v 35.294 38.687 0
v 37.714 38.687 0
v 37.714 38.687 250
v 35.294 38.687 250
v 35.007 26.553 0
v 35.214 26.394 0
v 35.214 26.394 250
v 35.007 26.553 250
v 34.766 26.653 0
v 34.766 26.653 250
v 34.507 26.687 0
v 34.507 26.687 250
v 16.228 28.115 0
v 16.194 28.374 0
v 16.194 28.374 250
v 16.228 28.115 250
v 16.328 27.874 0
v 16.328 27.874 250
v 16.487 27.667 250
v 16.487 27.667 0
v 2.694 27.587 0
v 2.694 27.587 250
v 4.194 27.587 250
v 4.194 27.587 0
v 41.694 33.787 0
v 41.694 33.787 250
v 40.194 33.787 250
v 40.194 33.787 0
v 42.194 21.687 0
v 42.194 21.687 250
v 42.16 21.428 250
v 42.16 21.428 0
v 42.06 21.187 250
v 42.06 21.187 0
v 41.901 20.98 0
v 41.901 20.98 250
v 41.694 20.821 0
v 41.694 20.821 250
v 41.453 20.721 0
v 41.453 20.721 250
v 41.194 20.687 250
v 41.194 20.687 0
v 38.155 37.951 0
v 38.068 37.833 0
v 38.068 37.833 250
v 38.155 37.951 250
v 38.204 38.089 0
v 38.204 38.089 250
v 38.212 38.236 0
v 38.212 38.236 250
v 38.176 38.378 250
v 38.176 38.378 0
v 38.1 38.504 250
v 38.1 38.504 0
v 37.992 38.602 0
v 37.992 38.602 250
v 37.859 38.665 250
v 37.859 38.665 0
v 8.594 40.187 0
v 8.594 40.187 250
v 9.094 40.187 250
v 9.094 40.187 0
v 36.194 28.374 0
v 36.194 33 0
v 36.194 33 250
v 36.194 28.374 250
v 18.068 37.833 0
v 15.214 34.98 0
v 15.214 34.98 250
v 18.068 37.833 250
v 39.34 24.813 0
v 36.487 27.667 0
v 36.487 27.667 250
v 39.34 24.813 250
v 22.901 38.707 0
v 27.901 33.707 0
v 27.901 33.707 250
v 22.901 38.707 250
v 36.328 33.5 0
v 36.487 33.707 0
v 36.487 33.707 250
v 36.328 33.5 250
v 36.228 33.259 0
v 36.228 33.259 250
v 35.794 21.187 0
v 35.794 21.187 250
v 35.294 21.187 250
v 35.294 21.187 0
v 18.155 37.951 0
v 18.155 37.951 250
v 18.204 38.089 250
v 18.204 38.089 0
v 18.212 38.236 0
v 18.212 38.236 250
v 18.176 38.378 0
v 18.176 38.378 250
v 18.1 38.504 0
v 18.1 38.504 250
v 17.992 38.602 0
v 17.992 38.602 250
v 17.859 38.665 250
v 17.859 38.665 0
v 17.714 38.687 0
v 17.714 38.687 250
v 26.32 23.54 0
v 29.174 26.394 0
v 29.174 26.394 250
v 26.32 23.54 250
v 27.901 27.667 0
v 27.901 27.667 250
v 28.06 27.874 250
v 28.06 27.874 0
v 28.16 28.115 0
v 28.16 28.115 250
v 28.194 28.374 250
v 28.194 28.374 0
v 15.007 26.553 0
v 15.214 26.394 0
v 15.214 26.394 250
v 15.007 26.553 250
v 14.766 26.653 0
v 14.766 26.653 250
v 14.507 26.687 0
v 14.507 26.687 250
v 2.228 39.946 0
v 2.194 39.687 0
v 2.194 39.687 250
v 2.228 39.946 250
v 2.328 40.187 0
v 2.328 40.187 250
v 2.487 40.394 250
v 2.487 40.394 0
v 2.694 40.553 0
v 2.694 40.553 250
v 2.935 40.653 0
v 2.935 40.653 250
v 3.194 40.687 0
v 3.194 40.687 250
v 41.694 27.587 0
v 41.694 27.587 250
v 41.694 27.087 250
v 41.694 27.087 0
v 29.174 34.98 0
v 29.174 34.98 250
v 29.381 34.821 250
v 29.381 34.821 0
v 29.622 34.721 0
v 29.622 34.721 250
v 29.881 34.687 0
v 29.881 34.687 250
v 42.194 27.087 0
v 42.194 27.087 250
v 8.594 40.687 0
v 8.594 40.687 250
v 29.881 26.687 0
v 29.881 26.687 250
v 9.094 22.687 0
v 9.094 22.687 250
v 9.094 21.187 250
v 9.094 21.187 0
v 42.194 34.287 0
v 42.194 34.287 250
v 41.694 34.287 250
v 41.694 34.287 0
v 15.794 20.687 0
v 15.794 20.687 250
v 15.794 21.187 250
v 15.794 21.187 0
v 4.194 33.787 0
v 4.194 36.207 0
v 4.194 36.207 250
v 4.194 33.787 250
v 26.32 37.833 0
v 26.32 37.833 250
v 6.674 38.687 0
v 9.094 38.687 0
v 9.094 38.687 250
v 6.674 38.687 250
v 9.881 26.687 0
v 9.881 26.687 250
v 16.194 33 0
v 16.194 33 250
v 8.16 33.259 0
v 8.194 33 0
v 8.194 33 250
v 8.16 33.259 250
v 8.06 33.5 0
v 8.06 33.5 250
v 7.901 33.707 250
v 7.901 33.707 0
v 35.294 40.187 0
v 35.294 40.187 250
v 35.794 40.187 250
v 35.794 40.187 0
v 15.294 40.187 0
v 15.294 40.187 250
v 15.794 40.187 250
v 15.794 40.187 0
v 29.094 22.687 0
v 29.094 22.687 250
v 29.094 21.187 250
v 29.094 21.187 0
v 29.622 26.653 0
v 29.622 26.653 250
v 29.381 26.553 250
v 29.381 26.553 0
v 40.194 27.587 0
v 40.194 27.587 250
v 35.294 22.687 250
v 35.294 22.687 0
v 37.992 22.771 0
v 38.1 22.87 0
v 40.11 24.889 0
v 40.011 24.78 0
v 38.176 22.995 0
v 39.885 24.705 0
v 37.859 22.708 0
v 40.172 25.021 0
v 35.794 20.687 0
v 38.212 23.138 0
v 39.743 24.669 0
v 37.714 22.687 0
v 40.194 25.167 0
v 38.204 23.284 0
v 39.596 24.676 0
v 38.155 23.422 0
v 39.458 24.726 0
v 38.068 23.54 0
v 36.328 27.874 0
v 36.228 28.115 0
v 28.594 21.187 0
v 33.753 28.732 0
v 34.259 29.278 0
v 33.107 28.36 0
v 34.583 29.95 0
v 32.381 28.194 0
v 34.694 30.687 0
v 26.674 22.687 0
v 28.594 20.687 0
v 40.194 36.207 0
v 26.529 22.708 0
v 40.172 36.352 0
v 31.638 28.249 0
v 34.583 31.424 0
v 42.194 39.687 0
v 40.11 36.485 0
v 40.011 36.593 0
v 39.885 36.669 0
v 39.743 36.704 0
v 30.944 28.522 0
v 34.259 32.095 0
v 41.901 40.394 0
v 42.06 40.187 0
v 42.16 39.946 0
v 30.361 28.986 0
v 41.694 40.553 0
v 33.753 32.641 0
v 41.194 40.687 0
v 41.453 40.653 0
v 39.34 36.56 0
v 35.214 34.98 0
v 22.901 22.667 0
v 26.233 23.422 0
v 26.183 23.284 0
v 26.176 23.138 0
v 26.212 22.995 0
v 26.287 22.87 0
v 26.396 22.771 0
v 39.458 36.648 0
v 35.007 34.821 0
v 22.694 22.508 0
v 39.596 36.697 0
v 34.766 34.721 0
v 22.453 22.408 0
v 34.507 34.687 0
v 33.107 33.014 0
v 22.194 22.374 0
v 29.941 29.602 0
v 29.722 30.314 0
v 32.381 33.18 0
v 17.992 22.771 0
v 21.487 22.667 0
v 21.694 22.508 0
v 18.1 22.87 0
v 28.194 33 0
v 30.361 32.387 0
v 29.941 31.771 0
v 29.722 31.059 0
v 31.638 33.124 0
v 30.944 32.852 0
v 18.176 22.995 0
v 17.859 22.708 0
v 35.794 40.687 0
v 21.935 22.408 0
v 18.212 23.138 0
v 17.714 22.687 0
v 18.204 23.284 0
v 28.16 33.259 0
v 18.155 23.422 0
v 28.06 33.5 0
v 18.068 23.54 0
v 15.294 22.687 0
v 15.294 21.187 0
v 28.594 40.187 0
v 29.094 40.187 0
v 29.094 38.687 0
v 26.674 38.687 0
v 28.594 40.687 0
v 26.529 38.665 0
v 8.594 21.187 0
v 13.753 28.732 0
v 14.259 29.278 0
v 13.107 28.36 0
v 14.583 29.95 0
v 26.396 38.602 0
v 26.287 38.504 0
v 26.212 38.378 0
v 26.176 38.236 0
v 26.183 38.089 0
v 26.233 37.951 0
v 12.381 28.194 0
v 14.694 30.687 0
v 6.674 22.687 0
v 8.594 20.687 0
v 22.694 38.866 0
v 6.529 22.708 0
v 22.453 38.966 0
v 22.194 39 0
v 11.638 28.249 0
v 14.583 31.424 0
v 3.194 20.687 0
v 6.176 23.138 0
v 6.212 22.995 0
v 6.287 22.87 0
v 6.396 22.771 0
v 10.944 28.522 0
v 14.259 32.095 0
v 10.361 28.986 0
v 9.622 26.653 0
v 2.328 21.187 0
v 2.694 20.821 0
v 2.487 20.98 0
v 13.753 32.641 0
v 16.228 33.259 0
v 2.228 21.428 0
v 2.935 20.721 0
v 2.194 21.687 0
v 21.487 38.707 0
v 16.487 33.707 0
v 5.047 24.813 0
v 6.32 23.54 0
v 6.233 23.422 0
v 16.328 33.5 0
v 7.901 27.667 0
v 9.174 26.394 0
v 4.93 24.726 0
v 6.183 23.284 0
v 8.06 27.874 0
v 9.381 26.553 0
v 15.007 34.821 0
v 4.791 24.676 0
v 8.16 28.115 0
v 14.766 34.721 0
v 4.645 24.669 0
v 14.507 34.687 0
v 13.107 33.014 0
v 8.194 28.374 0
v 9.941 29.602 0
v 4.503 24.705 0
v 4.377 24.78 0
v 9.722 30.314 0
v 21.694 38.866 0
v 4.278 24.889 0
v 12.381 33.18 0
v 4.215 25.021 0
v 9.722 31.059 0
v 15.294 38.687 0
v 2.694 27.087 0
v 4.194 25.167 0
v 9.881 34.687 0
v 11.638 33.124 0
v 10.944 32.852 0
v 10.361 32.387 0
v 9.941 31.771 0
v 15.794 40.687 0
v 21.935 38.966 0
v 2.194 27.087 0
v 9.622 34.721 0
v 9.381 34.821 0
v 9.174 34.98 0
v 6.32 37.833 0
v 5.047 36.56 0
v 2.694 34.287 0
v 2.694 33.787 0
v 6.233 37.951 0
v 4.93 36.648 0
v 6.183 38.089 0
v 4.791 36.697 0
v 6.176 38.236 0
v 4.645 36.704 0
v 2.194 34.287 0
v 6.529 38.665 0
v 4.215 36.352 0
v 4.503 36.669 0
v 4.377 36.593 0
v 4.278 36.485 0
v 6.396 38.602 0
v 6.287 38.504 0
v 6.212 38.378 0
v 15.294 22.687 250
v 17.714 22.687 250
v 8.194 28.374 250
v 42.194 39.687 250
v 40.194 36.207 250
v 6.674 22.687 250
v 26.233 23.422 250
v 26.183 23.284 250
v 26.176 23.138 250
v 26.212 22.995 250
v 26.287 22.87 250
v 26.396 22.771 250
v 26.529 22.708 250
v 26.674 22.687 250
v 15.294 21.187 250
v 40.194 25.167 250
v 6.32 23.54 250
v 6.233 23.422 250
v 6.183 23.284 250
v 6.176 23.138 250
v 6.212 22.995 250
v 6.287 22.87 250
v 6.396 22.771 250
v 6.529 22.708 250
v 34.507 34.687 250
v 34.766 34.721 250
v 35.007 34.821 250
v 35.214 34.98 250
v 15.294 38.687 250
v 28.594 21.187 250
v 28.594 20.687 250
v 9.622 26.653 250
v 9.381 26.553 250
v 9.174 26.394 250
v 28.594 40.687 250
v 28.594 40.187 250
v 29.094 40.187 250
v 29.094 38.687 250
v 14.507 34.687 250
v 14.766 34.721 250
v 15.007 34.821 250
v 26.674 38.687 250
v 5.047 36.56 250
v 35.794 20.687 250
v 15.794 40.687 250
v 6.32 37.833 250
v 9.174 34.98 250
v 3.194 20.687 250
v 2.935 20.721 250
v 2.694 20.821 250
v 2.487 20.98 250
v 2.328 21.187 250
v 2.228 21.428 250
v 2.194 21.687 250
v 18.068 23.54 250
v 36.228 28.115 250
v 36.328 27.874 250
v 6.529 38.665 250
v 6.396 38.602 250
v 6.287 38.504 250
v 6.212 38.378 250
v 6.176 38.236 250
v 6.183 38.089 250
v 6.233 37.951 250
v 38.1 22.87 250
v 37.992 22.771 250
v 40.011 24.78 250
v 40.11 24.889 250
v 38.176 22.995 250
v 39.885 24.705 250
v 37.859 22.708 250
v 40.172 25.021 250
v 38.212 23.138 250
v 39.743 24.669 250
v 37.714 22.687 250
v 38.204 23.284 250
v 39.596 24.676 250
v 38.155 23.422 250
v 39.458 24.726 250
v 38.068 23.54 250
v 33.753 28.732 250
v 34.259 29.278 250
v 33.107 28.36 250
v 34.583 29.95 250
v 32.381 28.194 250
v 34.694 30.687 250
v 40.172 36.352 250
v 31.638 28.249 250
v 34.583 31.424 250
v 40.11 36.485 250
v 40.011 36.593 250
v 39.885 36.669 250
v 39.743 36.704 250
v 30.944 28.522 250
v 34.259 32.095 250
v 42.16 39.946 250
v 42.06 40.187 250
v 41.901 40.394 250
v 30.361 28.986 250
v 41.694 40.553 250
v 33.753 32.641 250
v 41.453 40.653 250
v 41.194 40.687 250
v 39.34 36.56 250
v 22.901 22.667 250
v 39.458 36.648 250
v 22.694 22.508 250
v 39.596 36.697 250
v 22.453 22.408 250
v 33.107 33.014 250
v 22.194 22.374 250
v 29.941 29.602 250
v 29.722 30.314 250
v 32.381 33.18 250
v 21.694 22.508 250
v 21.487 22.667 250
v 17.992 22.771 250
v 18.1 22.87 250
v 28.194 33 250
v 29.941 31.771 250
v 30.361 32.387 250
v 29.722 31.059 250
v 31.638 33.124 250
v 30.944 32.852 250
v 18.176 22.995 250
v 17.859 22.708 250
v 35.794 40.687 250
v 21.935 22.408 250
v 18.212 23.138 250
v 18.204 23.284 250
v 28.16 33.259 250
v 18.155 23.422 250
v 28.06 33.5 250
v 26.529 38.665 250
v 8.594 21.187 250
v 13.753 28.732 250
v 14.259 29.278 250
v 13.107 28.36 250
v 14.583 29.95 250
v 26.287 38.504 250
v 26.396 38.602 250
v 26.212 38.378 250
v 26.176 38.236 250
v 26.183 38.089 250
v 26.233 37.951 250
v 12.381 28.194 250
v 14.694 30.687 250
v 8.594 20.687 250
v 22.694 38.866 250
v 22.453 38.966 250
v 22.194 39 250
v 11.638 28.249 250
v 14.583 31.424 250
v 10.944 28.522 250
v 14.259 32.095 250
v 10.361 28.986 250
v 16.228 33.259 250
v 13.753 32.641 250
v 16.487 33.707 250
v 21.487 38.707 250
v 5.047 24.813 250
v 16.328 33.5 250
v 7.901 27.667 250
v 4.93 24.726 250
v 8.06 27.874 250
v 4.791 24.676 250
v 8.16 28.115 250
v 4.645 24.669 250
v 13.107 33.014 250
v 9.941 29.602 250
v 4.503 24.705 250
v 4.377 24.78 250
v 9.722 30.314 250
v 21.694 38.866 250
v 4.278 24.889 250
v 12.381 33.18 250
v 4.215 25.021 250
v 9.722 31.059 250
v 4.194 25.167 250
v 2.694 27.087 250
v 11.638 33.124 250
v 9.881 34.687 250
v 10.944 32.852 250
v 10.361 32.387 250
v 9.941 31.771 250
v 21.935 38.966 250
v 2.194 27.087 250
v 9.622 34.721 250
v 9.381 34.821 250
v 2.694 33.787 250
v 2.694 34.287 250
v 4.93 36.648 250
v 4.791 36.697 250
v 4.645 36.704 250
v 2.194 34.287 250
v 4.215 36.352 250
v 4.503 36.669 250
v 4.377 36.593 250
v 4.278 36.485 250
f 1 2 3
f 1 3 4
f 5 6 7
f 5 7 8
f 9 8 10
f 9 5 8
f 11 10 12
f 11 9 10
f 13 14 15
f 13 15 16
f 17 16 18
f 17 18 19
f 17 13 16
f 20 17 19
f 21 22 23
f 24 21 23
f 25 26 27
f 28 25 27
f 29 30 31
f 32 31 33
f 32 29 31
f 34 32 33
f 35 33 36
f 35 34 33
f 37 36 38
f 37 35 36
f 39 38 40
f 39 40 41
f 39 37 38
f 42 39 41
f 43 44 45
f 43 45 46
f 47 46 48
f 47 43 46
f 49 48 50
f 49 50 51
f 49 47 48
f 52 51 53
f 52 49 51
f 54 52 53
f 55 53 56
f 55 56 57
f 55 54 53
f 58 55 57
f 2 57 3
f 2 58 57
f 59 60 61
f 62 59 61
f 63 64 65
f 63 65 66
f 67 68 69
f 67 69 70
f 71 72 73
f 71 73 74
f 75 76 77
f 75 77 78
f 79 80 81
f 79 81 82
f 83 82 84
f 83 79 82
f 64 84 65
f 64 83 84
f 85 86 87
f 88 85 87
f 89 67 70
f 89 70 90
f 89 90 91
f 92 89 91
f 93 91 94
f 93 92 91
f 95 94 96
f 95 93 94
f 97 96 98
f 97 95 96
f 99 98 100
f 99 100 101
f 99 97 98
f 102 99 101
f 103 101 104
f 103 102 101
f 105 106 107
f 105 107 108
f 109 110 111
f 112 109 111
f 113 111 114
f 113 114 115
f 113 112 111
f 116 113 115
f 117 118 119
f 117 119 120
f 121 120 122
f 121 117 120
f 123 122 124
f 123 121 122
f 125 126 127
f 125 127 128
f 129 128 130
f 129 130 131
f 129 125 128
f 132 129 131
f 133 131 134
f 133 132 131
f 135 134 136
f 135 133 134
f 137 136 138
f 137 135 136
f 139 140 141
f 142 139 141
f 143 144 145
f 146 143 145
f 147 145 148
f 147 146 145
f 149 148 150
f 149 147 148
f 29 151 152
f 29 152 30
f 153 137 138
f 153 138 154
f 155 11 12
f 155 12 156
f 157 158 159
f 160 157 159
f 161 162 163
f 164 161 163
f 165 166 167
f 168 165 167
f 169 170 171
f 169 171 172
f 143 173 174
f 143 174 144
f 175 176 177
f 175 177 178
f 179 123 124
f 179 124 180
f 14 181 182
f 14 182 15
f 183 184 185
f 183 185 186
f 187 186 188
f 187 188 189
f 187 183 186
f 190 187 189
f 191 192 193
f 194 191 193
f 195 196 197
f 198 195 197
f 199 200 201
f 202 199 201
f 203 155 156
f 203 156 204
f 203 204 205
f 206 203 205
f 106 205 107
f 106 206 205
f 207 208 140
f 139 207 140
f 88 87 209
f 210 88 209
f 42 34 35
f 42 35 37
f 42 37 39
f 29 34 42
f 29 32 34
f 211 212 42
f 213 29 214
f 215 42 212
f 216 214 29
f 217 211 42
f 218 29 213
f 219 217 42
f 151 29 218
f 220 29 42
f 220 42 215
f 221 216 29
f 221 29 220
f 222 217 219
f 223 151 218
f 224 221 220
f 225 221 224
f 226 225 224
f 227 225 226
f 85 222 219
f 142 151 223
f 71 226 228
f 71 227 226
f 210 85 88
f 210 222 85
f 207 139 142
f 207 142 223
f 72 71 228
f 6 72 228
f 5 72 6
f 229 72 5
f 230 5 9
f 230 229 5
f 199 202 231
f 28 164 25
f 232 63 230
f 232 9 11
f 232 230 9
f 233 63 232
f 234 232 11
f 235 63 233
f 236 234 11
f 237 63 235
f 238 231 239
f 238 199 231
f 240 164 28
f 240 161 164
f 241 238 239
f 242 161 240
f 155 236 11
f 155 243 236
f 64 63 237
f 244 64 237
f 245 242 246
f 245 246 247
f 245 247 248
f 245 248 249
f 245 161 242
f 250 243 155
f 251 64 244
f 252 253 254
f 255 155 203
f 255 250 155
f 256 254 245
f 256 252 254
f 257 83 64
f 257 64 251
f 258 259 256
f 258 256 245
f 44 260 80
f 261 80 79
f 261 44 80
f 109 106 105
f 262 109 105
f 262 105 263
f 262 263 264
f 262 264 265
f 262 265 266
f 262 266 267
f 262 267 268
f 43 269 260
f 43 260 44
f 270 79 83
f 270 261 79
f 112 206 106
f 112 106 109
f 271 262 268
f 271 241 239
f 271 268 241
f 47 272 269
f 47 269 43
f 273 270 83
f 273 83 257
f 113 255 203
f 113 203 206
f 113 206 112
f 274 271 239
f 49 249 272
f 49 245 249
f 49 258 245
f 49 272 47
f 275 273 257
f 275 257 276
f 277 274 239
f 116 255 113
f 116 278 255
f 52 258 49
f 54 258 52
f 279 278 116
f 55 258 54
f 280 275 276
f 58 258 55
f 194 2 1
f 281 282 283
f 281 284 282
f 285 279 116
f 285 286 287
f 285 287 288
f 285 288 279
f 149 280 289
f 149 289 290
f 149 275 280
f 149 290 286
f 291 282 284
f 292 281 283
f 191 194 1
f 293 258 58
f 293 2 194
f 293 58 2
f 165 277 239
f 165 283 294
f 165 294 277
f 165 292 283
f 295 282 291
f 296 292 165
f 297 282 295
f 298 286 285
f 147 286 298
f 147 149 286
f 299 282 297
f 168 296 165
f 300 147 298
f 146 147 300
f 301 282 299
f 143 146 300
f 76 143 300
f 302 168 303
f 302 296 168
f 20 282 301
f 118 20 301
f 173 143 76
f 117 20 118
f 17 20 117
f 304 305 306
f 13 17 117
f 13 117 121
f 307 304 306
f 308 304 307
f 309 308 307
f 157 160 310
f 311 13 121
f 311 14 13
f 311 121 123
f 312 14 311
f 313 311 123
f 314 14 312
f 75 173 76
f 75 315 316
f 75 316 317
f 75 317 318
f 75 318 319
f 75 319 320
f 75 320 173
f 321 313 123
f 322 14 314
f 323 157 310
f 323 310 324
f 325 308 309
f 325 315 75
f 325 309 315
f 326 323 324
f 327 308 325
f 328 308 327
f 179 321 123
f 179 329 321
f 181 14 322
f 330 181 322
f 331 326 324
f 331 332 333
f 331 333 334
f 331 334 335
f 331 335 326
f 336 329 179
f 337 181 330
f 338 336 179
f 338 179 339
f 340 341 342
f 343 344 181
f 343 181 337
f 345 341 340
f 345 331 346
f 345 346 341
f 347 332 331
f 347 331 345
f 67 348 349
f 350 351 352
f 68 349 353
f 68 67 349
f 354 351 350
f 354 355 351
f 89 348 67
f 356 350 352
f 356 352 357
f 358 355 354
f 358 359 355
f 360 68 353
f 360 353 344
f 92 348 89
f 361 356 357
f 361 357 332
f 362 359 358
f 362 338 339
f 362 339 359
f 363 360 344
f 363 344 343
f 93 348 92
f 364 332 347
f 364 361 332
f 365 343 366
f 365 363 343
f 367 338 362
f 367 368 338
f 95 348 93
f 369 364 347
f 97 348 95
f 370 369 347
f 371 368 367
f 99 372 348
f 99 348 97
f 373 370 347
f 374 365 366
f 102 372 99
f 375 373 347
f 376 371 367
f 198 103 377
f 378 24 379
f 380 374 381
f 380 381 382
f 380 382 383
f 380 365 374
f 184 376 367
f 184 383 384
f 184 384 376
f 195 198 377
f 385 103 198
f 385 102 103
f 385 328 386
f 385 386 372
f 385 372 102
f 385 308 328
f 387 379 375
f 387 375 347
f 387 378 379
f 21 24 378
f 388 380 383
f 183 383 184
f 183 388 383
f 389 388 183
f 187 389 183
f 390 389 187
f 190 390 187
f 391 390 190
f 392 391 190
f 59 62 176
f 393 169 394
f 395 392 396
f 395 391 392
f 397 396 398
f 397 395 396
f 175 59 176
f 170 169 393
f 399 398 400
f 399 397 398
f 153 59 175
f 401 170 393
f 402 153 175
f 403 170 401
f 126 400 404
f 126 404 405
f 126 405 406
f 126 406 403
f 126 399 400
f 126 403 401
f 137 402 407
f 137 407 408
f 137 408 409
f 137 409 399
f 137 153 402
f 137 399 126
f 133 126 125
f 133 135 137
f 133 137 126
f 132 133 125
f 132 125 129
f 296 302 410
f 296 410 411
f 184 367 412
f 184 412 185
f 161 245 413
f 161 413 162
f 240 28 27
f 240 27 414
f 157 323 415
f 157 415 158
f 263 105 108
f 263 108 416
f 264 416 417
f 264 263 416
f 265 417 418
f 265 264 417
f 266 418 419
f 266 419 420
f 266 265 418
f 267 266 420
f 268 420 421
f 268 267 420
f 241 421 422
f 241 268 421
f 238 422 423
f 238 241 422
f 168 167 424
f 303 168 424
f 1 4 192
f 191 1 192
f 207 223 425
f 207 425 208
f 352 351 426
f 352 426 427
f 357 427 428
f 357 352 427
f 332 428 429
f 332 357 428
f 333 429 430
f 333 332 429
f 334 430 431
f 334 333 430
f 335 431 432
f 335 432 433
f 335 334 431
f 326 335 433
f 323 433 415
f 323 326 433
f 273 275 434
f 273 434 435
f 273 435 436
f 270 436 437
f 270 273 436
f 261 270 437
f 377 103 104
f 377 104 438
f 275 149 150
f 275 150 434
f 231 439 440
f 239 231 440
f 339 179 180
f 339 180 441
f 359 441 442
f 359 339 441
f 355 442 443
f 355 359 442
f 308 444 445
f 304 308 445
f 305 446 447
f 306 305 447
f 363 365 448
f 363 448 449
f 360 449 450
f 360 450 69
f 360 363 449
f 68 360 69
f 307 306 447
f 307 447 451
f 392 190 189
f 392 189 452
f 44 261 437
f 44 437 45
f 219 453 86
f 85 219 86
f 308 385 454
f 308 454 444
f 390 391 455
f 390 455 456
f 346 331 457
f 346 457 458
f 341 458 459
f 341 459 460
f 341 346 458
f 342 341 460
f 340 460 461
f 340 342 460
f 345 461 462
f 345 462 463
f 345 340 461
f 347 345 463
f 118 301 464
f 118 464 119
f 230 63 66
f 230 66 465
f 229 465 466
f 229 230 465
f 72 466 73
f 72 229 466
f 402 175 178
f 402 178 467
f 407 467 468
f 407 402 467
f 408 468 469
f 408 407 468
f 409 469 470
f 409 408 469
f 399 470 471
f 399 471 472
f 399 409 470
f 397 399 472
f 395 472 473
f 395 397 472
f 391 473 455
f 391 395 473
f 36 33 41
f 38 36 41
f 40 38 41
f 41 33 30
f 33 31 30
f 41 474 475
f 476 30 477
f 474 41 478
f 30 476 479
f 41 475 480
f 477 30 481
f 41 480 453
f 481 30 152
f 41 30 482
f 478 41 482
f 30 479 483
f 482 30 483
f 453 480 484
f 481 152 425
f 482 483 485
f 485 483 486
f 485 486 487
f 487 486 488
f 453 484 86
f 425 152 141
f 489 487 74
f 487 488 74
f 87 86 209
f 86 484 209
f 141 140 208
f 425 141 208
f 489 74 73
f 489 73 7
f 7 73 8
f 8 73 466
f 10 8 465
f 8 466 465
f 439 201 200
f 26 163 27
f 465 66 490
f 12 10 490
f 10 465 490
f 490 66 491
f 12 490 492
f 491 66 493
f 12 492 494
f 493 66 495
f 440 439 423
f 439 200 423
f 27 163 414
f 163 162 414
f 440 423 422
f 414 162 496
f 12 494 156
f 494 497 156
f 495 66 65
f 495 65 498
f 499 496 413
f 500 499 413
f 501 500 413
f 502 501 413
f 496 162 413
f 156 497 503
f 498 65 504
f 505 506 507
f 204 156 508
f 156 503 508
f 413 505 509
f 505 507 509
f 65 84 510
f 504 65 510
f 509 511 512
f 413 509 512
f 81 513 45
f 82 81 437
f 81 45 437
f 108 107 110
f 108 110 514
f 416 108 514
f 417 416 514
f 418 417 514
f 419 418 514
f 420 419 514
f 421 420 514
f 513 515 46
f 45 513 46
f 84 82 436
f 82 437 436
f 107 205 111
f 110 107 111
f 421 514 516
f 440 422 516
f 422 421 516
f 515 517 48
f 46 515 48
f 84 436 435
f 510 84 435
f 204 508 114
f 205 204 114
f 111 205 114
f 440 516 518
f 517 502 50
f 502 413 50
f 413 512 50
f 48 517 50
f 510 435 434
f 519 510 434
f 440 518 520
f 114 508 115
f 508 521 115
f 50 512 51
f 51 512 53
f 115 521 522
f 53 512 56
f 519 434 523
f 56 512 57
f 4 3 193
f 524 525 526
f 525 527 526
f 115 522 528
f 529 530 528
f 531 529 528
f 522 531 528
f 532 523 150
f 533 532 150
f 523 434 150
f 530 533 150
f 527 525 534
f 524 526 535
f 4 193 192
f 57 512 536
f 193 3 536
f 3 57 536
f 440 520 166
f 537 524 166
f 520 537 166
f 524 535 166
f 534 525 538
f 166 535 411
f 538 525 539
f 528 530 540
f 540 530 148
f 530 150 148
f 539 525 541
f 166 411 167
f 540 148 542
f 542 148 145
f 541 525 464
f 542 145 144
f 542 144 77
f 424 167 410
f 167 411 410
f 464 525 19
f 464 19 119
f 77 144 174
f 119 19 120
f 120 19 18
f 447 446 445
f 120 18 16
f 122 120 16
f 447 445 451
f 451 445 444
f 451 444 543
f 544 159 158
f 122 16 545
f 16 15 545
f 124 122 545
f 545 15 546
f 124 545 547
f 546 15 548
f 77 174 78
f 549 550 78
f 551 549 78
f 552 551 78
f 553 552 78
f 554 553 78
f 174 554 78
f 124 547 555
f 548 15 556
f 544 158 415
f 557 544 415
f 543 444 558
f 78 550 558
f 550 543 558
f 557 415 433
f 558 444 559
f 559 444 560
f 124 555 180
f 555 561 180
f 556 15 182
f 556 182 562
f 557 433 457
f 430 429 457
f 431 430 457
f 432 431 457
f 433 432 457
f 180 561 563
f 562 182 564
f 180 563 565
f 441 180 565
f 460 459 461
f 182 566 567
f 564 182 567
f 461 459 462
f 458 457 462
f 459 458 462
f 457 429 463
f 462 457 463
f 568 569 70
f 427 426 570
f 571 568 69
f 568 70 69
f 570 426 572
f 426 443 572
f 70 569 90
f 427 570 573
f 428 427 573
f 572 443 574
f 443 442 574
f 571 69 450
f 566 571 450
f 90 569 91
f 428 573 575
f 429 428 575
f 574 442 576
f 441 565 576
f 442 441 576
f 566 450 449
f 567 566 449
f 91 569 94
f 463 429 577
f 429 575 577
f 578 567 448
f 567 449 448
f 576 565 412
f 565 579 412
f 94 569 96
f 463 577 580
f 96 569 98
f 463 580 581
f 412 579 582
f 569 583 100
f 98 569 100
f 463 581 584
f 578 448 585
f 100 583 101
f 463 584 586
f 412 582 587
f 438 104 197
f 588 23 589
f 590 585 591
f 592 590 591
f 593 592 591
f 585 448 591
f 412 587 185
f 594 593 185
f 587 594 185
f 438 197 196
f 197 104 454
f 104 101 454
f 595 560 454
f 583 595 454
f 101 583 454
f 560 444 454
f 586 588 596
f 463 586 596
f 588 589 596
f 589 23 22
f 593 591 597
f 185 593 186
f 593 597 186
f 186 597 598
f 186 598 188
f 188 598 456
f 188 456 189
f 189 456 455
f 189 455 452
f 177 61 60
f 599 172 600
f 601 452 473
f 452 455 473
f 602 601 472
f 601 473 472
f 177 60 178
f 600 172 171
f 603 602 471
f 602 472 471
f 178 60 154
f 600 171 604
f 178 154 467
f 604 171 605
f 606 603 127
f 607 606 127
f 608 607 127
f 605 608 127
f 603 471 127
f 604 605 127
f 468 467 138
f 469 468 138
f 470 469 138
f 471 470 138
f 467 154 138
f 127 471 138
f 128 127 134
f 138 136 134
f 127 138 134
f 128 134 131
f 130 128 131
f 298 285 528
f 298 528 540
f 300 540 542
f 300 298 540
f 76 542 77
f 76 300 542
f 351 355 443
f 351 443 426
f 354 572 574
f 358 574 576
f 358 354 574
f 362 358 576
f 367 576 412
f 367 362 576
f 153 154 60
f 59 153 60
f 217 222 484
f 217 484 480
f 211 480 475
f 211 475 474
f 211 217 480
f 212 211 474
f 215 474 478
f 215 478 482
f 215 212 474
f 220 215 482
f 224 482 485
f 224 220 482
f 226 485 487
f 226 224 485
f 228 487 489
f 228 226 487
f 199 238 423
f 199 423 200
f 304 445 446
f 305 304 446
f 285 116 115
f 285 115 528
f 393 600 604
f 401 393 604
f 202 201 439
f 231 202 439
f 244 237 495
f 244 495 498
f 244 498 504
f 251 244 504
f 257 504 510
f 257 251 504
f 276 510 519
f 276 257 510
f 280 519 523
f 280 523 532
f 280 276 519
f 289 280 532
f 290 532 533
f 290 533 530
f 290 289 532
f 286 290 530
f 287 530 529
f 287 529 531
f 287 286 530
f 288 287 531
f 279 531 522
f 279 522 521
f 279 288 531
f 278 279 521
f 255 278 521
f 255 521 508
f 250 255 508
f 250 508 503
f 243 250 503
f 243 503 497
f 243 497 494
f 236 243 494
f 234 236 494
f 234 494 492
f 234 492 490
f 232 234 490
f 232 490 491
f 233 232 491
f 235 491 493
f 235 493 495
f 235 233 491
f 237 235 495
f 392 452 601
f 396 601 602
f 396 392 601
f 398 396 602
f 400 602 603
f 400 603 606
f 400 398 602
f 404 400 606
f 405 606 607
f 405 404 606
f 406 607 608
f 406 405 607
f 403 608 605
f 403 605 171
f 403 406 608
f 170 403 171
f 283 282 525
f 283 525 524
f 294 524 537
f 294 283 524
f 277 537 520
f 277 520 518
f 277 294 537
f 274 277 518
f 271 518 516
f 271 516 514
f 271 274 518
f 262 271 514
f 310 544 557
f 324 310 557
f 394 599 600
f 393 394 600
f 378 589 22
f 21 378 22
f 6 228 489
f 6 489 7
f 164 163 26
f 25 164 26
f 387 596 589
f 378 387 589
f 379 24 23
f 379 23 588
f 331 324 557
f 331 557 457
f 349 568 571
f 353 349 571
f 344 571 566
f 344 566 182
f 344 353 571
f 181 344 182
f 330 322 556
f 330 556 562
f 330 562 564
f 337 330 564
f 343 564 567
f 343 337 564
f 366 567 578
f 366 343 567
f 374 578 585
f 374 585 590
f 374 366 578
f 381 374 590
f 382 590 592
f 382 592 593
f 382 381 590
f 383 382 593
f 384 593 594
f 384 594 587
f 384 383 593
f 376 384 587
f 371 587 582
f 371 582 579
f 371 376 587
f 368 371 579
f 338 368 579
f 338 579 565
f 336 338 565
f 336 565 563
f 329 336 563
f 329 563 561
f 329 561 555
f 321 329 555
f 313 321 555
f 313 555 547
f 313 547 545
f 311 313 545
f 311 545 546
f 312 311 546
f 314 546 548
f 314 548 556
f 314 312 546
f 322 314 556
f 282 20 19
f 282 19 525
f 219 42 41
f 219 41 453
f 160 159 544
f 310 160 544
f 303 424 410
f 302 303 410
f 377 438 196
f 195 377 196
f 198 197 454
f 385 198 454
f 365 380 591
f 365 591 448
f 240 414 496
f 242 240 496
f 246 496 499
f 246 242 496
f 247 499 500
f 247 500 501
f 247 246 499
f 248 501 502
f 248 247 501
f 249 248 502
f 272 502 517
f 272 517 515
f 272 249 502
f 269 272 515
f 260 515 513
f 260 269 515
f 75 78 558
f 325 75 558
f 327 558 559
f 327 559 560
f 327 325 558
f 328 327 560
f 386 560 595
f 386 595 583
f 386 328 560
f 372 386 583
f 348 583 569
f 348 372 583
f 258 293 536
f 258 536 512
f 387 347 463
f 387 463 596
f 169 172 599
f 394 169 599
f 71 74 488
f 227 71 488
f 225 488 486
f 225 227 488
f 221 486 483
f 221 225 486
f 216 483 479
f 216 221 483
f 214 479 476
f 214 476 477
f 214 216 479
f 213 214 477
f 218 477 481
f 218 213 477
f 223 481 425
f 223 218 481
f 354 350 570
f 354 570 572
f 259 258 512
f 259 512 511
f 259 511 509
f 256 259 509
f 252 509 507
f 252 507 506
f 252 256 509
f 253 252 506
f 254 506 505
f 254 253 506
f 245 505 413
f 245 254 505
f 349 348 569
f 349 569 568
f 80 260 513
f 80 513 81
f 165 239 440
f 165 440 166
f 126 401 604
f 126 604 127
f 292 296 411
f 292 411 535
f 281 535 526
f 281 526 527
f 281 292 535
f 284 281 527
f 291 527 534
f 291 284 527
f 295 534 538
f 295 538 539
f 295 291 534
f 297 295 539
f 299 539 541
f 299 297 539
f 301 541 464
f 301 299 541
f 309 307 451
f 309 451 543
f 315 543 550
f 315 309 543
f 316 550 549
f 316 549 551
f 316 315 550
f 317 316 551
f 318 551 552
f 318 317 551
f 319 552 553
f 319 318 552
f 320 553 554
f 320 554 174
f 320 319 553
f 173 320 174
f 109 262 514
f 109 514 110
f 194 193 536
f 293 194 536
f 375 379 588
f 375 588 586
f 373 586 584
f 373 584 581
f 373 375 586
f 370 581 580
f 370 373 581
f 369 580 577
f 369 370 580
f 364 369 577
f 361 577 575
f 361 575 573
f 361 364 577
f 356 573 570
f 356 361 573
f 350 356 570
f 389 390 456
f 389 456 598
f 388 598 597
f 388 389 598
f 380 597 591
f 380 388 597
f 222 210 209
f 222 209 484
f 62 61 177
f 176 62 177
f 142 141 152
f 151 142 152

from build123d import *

# Parameters (mm, degrees)
SKETCH_1_R      = 2.5
EXTRUDE_1_DEPTH = 250


with BuildPart() as part:
    # 草图1 → 拉伸1 (new body)
    with BuildSketch(Plane.XY):
        with BuildLine():
            Line((36.486773435, 27.666621685), (39.340326826, 24.813068294))
            ThreePointArc((39.340326826, 24.813068294), (39.885221932, 24.704681919), (40.193880216, 25.166621685))
            Line((40.193880216, 25.166621685), (40.193880216, 27.586722697))
            Line((40.193880216, 27.586722697), (41.693880216, 27.586722697))
            Line((41.693880216, 27.586722697), (41.693880216, 27.086722697))
            Line((41.693880216, 27.086722697), (42.193880216, 27.086722697))
            Line((42.193880216, 27.086722697), (42.193880216, 21.686722697))
            ThreePointArc((42.193880216, 21.686722697), (41.900986997, 20.979615916), (41.193880216, 20.686722697))
            Line((41.193880216, 20.686722697), (35.793880216, 20.686722697))
            Line((35.793880216, 20.686722697), (35.793880216, 21.186722697))
            Line((35.793880216, 21.186722697), (35.293880216, 21.186722697))
            Line((35.293880216, 21.186722697), (35.293880216, 22.686722697))
            Line((35.293880216, 22.686722697), (37.713981229, 22.686722697))
            ThreePointArc((37.713981229, 22.686722697), (38.175920995, 22.995380981), (38.06753462, 23.540276088))
            Line((38.06753462, 23.540276088), (35.213981229, 26.393829479))
            ThreePointArc((35.213981229, 26.393829479), (34.88955788, 26.61060223), (34.506874448, 26.686722697))
            Line((34.506874448, 26.686722697), (29.880885985, 26.686722697))
            ThreePointArc((29.880885985, 26.686722697), (29.498202552, 26.61060223), (29.173779204, 26.393829479))
            Line((29.173779204, 26.393829479), (26.320225813, 23.540276088))
            ThreePointArc((26.320225813, 23.540276088), (26.211839437, 22.995380981), (26.673779204, 22.686722697))
            Line((26.673779204, 22.686722697), (29.093880216, 22.686722697))
            Line((29.093880216, 22.686722697), (29.093880216, 21.186722697))
            Line((29.093880216, 21.186722697), (28.593880216, 21.186722697))
            Line((28.593880216, 21.186722697), (28.593880216, 20.686722697))
            Line((28.593880216, 20.686722697), (15.793880216, 20.686722697))
            Line((15.793880216, 20.686722697), (15.793880216, 21.186722697))
            Line((15.793880216, 21.186722697), (15.293880216, 21.186722697))
            Line((15.293880216, 21.186722697), (15.293880216, 22.686722697))
            Line((15.293880216, 22.686722697), (17.713981229, 22.686722697))
            ThreePointArc((17.713981229, 22.686722697), (18.175920995, 22.995380981), (18.06753462, 23.540276088))
            Line((18.06753462, 23.540276088), (15.213981229, 26.393829479))
            ThreePointArc((15.213981229, 26.393829479), (14.88955788, 26.61060223), (14.506874448, 26.686722697))
            Line((14.506874448, 26.686722697), (9.880885985, 26.686722697))
            ThreePointArc((9.880885985, 26.686722697), (9.498202552, 26.61060223), (9.173779204, 26.393829479))
            Line((9.173779204, 26.393829479), (6.320225813, 23.540276088))
            ThreePointArc((6.320225813, 23.540276088), (6.211839437, 22.995380981), (6.673779204, 22.686722697))
            Line((6.673779204, 22.686722697), (9.093880216, 22.686722697))
            Line((9.093880216, 22.686722697), (9.093880216, 21.186722697))
            Line((9.093880216, 21.186722697), (8.593880216, 21.186722697))
            Line((8.593880216, 21.186722697), (8.593880216, 20.686722697))
            Line((8.593880216, 20.686722697), (3.193880216, 20.686722697))
            ThreePointArc((3.193880216, 20.686722697), (2.486773435, 20.979615916), (2.193880216, 21.686722697))
            Line((2.193880216, 21.686722697), (2.193880216, 27.086722697))
            Line((2.193880216, 27.086722697), (2.693880216, 27.086722697))
            Line((2.693880216, 27.086722697), (2.693880216, 27.586722697))
            Line((2.693880216, 27.586722697), (4.193880216, 27.586722697))
            Line((4.193880216, 27.586722697), (4.193880216, 25.166621685))
            ThreePointArc((4.193880216, 25.166621685), (4.5025385, 24.704681919), (5.047433607, 24.813068294))
            Line((5.047433607, 24.813068294), (7.900986997, 27.666621685))
            ThreePointArc((7.900986997, 27.666621685), (8.117759749, 27.991045034), (8.193880216, 28.373728466))
            Line((8.193880216, 28.373728466), (8.193880216, 32.999716929))
            ThreePointArc((8.193880216, 32.999716929), (8.117759749, 33.382400361), (7.900986997, 33.70682371))
            Line((7.900986997, 33.70682371), (5.047433607, 36.560377101))
            ThreePointArc((5.047433607, 36.560377101), (4.5025385, 36.668763476), (4.193880216, 36.20682371))
            Line((4.193880216, 36.20682371), (4.193880216, 33.786722697))
            Line((4.193880216, 33.786722697), (2.693880216, 33.786722697))
            Line((2.693880216, 33.786722697), (2.693880216, 34.286722697))
            Line((2.693880216, 34.286722697), (2.193880216, 34.286722697))
            Line((2.193880216, 34.286722697), (2.193880216, 39.686722697))
            ThreePointArc((2.193880216, 39.686722697), (2.486773435, 40.393829479), (3.193880216, 40.686722697))
            Line((3.193880216, 40.686722697), (8.593880216, 40.686722697))
            Line((8.593880216, 40.686722697), (8.593880216, 40.186722697))
            Line((8.593880216, 40.186722697), (9.093880216, 40.186722697))
            Line((9.093880216, 40.186722697), (9.093880216, 38.686722697))
            Line((9.093880216, 38.686722697), (6.673779204, 38.686722697))
            ThreePointArc((6.673779204, 38.686722697), (6.211839437, 38.378064414), (6.320225813, 37.833169307))
            Line((6.320225813, 37.833169307), (9.173779204, 34.979615916))
            ThreePointArc((9.173779204, 34.979615916), (9.498202552, 34.762843165), (9.880885985, 34.686722697))
            Line((9.880885985, 34.686722697), (14.506874448, 34.686722697))
            ThreePointArc((14.506874448, 34.686722697), (14.88955788, 34.762843165), (15.213981229, 34.979615916))
            Line((15.213981229, 34.979615916), (18.06753462, 37.833169307))
            ThreePointArc((18.06753462, 37.833169307), (18.175920995, 38.378064414), (17.713981229, 38.686722697))
            Line((17.713981229, 38.686722697), (15.293880216, 38.686722697))
            Line((15.293880216, 38.686722697), (15.293880216, 40.186722697))
            Line((15.293880216, 40.186722697), (15.793880216, 40.186722697))
            Line((15.793880216, 40.186722697), (15.793880216, 40.686722697))
            Line((15.793880216, 40.686722697), (28.593880216, 40.686722697))
            Line((28.593880216, 40.686722697), (28.593880216, 40.186722697))
            Line((28.593880216, 40.186722697), (29.093880216, 40.186722697))
            Line((29.093880216, 40.186722697), (29.093880216, 38.686722697))
            Line((29.093880216, 38.686722697), (26.673779204, 38.686722697))
            ThreePointArc((26.673779204, 38.686722697), (26.211839437, 38.378064414), (26.320225813, 37.833169307))
            Line((26.320225813, 37.833169307), (29.173779204, 34.979615916))
            ThreePointArc((29.173779204, 34.979615916), (29.498202552, 34.762843165), (29.880885985, 34.686722697))
            Line((29.880885985, 34.686722697), (34.506874448, 34.686722697))
            ThreePointArc((34.506874448, 34.686722697), (34.88955788, 34.762843165), (35.213981229, 34.979615916))
            Line((35.213981229, 34.979615916), (38.06753462, 37.833169307))
            ThreePointArc((38.06753462, 37.833169307), (38.175920995, 38.378064414), (37.713981229, 38.686722697))
            Line((37.713981229, 38.686722697), (35.293880216, 38.686722697))
            Line((35.293880216, 38.686722697), (35.293880216, 40.186722697))
            Line((35.293880216, 40.186722697), (35.793880216, 40.186722697))
            Line((35.793880216, 40.186722697), (35.793880216, 40.686722697))
            Line((35.793880216, 40.686722697), (41.193880216, 40.686722697))
            ThreePointArc((41.193880216, 40.686722697), (41.900986997, 40.393829479), (42.193880216, 39.686722697))
            Line((42.193880216, 39.686722697), (42.193880216, 34.286722697))
            Line((42.193880216, 34.286722697), (41.693880216, 34.286722697))
            Line((41.693880216, 34.286722697), (41.693880216, 33.786722697))
            Line((41.693880216, 33.786722697), (40.193880216, 33.786722697))
            Line((40.193880216, 33.786722697), (40.193880216, 36.20682371))
            ThreePointArc((40.193880216, 36.20682371), (39.885221932, 36.668763476), (39.340326826, 36.560377101))
            Line((39.340326826, 36.560377101), (36.486773435, 33.70682371))
            ThreePointArc((36.486773435, 33.70682371), (36.270000684, 33.382400361), (36.193880216, 32.999716929))
            Line((36.193880216, 32.999716929), (36.193880216, 28.373728466))
            ThreePointArc((36.193880216, 28.373728466), (36.270000684, 27.991045034), (36.486773435, 27.666621685))
        make_face()
        with Locations((12.193880216, 30.686722697)):
            Circle(SKETCH_1_R, mode=Mode.SUBTRACT)
        with Locations((32.193880216, 30.686722697)):
            Circle(SKETCH_1_R, mode=Mode.SUBTRACT)
        with BuildLine():
            Line((16.486773435, 27.666621685), (21.48677343, 22.66662169))
            ThreePointArc((21.48677343, 22.66662169), (22.193880211, 22.373728471), (22.900986992, 22.66662169))
            Line((22.900986992, 22.66662169), (27.900986992, 27.66662169))
            ThreePointArc((27.900986992, 27.66662169), (28.117759744, 27.991045039), (28.193880211, 28.373728471))
            Line((28.193880211, 28.373728471), (28.193880211, 32.999716923))
            ThreePointArc((28.193880211, 32.999716923), (28.117759744, 33.382400355), (27.900986992, 33.706823704))
            Line((27.900986992, 33.706823704), (22.900986992, 38.706823705))
            ThreePointArc((22.900986992, 38.706823705), (22.193880211, 38.999716923), (21.48677343, 38.706823705))
            Line((21.48677343, 38.706823705), (16.486773435, 33.70682371))
            ThreePointArc((16.486773435, 33.70682371), (16.270000684, 33.382400361), (16.193880216, 32.999716929))
            Line((16.193880216, 32.999716929), (16.193880216, 28.373728466))
            ThreePointArc((16.193880216, 28.373728466), (16.270000684, 27.991045034), (16.486773435, 27.666621685))
        make_face(mode=Mode.SUBTRACT)
    extrude(amount=EXTRUDE_1_DEPTH)


solid = part.part
